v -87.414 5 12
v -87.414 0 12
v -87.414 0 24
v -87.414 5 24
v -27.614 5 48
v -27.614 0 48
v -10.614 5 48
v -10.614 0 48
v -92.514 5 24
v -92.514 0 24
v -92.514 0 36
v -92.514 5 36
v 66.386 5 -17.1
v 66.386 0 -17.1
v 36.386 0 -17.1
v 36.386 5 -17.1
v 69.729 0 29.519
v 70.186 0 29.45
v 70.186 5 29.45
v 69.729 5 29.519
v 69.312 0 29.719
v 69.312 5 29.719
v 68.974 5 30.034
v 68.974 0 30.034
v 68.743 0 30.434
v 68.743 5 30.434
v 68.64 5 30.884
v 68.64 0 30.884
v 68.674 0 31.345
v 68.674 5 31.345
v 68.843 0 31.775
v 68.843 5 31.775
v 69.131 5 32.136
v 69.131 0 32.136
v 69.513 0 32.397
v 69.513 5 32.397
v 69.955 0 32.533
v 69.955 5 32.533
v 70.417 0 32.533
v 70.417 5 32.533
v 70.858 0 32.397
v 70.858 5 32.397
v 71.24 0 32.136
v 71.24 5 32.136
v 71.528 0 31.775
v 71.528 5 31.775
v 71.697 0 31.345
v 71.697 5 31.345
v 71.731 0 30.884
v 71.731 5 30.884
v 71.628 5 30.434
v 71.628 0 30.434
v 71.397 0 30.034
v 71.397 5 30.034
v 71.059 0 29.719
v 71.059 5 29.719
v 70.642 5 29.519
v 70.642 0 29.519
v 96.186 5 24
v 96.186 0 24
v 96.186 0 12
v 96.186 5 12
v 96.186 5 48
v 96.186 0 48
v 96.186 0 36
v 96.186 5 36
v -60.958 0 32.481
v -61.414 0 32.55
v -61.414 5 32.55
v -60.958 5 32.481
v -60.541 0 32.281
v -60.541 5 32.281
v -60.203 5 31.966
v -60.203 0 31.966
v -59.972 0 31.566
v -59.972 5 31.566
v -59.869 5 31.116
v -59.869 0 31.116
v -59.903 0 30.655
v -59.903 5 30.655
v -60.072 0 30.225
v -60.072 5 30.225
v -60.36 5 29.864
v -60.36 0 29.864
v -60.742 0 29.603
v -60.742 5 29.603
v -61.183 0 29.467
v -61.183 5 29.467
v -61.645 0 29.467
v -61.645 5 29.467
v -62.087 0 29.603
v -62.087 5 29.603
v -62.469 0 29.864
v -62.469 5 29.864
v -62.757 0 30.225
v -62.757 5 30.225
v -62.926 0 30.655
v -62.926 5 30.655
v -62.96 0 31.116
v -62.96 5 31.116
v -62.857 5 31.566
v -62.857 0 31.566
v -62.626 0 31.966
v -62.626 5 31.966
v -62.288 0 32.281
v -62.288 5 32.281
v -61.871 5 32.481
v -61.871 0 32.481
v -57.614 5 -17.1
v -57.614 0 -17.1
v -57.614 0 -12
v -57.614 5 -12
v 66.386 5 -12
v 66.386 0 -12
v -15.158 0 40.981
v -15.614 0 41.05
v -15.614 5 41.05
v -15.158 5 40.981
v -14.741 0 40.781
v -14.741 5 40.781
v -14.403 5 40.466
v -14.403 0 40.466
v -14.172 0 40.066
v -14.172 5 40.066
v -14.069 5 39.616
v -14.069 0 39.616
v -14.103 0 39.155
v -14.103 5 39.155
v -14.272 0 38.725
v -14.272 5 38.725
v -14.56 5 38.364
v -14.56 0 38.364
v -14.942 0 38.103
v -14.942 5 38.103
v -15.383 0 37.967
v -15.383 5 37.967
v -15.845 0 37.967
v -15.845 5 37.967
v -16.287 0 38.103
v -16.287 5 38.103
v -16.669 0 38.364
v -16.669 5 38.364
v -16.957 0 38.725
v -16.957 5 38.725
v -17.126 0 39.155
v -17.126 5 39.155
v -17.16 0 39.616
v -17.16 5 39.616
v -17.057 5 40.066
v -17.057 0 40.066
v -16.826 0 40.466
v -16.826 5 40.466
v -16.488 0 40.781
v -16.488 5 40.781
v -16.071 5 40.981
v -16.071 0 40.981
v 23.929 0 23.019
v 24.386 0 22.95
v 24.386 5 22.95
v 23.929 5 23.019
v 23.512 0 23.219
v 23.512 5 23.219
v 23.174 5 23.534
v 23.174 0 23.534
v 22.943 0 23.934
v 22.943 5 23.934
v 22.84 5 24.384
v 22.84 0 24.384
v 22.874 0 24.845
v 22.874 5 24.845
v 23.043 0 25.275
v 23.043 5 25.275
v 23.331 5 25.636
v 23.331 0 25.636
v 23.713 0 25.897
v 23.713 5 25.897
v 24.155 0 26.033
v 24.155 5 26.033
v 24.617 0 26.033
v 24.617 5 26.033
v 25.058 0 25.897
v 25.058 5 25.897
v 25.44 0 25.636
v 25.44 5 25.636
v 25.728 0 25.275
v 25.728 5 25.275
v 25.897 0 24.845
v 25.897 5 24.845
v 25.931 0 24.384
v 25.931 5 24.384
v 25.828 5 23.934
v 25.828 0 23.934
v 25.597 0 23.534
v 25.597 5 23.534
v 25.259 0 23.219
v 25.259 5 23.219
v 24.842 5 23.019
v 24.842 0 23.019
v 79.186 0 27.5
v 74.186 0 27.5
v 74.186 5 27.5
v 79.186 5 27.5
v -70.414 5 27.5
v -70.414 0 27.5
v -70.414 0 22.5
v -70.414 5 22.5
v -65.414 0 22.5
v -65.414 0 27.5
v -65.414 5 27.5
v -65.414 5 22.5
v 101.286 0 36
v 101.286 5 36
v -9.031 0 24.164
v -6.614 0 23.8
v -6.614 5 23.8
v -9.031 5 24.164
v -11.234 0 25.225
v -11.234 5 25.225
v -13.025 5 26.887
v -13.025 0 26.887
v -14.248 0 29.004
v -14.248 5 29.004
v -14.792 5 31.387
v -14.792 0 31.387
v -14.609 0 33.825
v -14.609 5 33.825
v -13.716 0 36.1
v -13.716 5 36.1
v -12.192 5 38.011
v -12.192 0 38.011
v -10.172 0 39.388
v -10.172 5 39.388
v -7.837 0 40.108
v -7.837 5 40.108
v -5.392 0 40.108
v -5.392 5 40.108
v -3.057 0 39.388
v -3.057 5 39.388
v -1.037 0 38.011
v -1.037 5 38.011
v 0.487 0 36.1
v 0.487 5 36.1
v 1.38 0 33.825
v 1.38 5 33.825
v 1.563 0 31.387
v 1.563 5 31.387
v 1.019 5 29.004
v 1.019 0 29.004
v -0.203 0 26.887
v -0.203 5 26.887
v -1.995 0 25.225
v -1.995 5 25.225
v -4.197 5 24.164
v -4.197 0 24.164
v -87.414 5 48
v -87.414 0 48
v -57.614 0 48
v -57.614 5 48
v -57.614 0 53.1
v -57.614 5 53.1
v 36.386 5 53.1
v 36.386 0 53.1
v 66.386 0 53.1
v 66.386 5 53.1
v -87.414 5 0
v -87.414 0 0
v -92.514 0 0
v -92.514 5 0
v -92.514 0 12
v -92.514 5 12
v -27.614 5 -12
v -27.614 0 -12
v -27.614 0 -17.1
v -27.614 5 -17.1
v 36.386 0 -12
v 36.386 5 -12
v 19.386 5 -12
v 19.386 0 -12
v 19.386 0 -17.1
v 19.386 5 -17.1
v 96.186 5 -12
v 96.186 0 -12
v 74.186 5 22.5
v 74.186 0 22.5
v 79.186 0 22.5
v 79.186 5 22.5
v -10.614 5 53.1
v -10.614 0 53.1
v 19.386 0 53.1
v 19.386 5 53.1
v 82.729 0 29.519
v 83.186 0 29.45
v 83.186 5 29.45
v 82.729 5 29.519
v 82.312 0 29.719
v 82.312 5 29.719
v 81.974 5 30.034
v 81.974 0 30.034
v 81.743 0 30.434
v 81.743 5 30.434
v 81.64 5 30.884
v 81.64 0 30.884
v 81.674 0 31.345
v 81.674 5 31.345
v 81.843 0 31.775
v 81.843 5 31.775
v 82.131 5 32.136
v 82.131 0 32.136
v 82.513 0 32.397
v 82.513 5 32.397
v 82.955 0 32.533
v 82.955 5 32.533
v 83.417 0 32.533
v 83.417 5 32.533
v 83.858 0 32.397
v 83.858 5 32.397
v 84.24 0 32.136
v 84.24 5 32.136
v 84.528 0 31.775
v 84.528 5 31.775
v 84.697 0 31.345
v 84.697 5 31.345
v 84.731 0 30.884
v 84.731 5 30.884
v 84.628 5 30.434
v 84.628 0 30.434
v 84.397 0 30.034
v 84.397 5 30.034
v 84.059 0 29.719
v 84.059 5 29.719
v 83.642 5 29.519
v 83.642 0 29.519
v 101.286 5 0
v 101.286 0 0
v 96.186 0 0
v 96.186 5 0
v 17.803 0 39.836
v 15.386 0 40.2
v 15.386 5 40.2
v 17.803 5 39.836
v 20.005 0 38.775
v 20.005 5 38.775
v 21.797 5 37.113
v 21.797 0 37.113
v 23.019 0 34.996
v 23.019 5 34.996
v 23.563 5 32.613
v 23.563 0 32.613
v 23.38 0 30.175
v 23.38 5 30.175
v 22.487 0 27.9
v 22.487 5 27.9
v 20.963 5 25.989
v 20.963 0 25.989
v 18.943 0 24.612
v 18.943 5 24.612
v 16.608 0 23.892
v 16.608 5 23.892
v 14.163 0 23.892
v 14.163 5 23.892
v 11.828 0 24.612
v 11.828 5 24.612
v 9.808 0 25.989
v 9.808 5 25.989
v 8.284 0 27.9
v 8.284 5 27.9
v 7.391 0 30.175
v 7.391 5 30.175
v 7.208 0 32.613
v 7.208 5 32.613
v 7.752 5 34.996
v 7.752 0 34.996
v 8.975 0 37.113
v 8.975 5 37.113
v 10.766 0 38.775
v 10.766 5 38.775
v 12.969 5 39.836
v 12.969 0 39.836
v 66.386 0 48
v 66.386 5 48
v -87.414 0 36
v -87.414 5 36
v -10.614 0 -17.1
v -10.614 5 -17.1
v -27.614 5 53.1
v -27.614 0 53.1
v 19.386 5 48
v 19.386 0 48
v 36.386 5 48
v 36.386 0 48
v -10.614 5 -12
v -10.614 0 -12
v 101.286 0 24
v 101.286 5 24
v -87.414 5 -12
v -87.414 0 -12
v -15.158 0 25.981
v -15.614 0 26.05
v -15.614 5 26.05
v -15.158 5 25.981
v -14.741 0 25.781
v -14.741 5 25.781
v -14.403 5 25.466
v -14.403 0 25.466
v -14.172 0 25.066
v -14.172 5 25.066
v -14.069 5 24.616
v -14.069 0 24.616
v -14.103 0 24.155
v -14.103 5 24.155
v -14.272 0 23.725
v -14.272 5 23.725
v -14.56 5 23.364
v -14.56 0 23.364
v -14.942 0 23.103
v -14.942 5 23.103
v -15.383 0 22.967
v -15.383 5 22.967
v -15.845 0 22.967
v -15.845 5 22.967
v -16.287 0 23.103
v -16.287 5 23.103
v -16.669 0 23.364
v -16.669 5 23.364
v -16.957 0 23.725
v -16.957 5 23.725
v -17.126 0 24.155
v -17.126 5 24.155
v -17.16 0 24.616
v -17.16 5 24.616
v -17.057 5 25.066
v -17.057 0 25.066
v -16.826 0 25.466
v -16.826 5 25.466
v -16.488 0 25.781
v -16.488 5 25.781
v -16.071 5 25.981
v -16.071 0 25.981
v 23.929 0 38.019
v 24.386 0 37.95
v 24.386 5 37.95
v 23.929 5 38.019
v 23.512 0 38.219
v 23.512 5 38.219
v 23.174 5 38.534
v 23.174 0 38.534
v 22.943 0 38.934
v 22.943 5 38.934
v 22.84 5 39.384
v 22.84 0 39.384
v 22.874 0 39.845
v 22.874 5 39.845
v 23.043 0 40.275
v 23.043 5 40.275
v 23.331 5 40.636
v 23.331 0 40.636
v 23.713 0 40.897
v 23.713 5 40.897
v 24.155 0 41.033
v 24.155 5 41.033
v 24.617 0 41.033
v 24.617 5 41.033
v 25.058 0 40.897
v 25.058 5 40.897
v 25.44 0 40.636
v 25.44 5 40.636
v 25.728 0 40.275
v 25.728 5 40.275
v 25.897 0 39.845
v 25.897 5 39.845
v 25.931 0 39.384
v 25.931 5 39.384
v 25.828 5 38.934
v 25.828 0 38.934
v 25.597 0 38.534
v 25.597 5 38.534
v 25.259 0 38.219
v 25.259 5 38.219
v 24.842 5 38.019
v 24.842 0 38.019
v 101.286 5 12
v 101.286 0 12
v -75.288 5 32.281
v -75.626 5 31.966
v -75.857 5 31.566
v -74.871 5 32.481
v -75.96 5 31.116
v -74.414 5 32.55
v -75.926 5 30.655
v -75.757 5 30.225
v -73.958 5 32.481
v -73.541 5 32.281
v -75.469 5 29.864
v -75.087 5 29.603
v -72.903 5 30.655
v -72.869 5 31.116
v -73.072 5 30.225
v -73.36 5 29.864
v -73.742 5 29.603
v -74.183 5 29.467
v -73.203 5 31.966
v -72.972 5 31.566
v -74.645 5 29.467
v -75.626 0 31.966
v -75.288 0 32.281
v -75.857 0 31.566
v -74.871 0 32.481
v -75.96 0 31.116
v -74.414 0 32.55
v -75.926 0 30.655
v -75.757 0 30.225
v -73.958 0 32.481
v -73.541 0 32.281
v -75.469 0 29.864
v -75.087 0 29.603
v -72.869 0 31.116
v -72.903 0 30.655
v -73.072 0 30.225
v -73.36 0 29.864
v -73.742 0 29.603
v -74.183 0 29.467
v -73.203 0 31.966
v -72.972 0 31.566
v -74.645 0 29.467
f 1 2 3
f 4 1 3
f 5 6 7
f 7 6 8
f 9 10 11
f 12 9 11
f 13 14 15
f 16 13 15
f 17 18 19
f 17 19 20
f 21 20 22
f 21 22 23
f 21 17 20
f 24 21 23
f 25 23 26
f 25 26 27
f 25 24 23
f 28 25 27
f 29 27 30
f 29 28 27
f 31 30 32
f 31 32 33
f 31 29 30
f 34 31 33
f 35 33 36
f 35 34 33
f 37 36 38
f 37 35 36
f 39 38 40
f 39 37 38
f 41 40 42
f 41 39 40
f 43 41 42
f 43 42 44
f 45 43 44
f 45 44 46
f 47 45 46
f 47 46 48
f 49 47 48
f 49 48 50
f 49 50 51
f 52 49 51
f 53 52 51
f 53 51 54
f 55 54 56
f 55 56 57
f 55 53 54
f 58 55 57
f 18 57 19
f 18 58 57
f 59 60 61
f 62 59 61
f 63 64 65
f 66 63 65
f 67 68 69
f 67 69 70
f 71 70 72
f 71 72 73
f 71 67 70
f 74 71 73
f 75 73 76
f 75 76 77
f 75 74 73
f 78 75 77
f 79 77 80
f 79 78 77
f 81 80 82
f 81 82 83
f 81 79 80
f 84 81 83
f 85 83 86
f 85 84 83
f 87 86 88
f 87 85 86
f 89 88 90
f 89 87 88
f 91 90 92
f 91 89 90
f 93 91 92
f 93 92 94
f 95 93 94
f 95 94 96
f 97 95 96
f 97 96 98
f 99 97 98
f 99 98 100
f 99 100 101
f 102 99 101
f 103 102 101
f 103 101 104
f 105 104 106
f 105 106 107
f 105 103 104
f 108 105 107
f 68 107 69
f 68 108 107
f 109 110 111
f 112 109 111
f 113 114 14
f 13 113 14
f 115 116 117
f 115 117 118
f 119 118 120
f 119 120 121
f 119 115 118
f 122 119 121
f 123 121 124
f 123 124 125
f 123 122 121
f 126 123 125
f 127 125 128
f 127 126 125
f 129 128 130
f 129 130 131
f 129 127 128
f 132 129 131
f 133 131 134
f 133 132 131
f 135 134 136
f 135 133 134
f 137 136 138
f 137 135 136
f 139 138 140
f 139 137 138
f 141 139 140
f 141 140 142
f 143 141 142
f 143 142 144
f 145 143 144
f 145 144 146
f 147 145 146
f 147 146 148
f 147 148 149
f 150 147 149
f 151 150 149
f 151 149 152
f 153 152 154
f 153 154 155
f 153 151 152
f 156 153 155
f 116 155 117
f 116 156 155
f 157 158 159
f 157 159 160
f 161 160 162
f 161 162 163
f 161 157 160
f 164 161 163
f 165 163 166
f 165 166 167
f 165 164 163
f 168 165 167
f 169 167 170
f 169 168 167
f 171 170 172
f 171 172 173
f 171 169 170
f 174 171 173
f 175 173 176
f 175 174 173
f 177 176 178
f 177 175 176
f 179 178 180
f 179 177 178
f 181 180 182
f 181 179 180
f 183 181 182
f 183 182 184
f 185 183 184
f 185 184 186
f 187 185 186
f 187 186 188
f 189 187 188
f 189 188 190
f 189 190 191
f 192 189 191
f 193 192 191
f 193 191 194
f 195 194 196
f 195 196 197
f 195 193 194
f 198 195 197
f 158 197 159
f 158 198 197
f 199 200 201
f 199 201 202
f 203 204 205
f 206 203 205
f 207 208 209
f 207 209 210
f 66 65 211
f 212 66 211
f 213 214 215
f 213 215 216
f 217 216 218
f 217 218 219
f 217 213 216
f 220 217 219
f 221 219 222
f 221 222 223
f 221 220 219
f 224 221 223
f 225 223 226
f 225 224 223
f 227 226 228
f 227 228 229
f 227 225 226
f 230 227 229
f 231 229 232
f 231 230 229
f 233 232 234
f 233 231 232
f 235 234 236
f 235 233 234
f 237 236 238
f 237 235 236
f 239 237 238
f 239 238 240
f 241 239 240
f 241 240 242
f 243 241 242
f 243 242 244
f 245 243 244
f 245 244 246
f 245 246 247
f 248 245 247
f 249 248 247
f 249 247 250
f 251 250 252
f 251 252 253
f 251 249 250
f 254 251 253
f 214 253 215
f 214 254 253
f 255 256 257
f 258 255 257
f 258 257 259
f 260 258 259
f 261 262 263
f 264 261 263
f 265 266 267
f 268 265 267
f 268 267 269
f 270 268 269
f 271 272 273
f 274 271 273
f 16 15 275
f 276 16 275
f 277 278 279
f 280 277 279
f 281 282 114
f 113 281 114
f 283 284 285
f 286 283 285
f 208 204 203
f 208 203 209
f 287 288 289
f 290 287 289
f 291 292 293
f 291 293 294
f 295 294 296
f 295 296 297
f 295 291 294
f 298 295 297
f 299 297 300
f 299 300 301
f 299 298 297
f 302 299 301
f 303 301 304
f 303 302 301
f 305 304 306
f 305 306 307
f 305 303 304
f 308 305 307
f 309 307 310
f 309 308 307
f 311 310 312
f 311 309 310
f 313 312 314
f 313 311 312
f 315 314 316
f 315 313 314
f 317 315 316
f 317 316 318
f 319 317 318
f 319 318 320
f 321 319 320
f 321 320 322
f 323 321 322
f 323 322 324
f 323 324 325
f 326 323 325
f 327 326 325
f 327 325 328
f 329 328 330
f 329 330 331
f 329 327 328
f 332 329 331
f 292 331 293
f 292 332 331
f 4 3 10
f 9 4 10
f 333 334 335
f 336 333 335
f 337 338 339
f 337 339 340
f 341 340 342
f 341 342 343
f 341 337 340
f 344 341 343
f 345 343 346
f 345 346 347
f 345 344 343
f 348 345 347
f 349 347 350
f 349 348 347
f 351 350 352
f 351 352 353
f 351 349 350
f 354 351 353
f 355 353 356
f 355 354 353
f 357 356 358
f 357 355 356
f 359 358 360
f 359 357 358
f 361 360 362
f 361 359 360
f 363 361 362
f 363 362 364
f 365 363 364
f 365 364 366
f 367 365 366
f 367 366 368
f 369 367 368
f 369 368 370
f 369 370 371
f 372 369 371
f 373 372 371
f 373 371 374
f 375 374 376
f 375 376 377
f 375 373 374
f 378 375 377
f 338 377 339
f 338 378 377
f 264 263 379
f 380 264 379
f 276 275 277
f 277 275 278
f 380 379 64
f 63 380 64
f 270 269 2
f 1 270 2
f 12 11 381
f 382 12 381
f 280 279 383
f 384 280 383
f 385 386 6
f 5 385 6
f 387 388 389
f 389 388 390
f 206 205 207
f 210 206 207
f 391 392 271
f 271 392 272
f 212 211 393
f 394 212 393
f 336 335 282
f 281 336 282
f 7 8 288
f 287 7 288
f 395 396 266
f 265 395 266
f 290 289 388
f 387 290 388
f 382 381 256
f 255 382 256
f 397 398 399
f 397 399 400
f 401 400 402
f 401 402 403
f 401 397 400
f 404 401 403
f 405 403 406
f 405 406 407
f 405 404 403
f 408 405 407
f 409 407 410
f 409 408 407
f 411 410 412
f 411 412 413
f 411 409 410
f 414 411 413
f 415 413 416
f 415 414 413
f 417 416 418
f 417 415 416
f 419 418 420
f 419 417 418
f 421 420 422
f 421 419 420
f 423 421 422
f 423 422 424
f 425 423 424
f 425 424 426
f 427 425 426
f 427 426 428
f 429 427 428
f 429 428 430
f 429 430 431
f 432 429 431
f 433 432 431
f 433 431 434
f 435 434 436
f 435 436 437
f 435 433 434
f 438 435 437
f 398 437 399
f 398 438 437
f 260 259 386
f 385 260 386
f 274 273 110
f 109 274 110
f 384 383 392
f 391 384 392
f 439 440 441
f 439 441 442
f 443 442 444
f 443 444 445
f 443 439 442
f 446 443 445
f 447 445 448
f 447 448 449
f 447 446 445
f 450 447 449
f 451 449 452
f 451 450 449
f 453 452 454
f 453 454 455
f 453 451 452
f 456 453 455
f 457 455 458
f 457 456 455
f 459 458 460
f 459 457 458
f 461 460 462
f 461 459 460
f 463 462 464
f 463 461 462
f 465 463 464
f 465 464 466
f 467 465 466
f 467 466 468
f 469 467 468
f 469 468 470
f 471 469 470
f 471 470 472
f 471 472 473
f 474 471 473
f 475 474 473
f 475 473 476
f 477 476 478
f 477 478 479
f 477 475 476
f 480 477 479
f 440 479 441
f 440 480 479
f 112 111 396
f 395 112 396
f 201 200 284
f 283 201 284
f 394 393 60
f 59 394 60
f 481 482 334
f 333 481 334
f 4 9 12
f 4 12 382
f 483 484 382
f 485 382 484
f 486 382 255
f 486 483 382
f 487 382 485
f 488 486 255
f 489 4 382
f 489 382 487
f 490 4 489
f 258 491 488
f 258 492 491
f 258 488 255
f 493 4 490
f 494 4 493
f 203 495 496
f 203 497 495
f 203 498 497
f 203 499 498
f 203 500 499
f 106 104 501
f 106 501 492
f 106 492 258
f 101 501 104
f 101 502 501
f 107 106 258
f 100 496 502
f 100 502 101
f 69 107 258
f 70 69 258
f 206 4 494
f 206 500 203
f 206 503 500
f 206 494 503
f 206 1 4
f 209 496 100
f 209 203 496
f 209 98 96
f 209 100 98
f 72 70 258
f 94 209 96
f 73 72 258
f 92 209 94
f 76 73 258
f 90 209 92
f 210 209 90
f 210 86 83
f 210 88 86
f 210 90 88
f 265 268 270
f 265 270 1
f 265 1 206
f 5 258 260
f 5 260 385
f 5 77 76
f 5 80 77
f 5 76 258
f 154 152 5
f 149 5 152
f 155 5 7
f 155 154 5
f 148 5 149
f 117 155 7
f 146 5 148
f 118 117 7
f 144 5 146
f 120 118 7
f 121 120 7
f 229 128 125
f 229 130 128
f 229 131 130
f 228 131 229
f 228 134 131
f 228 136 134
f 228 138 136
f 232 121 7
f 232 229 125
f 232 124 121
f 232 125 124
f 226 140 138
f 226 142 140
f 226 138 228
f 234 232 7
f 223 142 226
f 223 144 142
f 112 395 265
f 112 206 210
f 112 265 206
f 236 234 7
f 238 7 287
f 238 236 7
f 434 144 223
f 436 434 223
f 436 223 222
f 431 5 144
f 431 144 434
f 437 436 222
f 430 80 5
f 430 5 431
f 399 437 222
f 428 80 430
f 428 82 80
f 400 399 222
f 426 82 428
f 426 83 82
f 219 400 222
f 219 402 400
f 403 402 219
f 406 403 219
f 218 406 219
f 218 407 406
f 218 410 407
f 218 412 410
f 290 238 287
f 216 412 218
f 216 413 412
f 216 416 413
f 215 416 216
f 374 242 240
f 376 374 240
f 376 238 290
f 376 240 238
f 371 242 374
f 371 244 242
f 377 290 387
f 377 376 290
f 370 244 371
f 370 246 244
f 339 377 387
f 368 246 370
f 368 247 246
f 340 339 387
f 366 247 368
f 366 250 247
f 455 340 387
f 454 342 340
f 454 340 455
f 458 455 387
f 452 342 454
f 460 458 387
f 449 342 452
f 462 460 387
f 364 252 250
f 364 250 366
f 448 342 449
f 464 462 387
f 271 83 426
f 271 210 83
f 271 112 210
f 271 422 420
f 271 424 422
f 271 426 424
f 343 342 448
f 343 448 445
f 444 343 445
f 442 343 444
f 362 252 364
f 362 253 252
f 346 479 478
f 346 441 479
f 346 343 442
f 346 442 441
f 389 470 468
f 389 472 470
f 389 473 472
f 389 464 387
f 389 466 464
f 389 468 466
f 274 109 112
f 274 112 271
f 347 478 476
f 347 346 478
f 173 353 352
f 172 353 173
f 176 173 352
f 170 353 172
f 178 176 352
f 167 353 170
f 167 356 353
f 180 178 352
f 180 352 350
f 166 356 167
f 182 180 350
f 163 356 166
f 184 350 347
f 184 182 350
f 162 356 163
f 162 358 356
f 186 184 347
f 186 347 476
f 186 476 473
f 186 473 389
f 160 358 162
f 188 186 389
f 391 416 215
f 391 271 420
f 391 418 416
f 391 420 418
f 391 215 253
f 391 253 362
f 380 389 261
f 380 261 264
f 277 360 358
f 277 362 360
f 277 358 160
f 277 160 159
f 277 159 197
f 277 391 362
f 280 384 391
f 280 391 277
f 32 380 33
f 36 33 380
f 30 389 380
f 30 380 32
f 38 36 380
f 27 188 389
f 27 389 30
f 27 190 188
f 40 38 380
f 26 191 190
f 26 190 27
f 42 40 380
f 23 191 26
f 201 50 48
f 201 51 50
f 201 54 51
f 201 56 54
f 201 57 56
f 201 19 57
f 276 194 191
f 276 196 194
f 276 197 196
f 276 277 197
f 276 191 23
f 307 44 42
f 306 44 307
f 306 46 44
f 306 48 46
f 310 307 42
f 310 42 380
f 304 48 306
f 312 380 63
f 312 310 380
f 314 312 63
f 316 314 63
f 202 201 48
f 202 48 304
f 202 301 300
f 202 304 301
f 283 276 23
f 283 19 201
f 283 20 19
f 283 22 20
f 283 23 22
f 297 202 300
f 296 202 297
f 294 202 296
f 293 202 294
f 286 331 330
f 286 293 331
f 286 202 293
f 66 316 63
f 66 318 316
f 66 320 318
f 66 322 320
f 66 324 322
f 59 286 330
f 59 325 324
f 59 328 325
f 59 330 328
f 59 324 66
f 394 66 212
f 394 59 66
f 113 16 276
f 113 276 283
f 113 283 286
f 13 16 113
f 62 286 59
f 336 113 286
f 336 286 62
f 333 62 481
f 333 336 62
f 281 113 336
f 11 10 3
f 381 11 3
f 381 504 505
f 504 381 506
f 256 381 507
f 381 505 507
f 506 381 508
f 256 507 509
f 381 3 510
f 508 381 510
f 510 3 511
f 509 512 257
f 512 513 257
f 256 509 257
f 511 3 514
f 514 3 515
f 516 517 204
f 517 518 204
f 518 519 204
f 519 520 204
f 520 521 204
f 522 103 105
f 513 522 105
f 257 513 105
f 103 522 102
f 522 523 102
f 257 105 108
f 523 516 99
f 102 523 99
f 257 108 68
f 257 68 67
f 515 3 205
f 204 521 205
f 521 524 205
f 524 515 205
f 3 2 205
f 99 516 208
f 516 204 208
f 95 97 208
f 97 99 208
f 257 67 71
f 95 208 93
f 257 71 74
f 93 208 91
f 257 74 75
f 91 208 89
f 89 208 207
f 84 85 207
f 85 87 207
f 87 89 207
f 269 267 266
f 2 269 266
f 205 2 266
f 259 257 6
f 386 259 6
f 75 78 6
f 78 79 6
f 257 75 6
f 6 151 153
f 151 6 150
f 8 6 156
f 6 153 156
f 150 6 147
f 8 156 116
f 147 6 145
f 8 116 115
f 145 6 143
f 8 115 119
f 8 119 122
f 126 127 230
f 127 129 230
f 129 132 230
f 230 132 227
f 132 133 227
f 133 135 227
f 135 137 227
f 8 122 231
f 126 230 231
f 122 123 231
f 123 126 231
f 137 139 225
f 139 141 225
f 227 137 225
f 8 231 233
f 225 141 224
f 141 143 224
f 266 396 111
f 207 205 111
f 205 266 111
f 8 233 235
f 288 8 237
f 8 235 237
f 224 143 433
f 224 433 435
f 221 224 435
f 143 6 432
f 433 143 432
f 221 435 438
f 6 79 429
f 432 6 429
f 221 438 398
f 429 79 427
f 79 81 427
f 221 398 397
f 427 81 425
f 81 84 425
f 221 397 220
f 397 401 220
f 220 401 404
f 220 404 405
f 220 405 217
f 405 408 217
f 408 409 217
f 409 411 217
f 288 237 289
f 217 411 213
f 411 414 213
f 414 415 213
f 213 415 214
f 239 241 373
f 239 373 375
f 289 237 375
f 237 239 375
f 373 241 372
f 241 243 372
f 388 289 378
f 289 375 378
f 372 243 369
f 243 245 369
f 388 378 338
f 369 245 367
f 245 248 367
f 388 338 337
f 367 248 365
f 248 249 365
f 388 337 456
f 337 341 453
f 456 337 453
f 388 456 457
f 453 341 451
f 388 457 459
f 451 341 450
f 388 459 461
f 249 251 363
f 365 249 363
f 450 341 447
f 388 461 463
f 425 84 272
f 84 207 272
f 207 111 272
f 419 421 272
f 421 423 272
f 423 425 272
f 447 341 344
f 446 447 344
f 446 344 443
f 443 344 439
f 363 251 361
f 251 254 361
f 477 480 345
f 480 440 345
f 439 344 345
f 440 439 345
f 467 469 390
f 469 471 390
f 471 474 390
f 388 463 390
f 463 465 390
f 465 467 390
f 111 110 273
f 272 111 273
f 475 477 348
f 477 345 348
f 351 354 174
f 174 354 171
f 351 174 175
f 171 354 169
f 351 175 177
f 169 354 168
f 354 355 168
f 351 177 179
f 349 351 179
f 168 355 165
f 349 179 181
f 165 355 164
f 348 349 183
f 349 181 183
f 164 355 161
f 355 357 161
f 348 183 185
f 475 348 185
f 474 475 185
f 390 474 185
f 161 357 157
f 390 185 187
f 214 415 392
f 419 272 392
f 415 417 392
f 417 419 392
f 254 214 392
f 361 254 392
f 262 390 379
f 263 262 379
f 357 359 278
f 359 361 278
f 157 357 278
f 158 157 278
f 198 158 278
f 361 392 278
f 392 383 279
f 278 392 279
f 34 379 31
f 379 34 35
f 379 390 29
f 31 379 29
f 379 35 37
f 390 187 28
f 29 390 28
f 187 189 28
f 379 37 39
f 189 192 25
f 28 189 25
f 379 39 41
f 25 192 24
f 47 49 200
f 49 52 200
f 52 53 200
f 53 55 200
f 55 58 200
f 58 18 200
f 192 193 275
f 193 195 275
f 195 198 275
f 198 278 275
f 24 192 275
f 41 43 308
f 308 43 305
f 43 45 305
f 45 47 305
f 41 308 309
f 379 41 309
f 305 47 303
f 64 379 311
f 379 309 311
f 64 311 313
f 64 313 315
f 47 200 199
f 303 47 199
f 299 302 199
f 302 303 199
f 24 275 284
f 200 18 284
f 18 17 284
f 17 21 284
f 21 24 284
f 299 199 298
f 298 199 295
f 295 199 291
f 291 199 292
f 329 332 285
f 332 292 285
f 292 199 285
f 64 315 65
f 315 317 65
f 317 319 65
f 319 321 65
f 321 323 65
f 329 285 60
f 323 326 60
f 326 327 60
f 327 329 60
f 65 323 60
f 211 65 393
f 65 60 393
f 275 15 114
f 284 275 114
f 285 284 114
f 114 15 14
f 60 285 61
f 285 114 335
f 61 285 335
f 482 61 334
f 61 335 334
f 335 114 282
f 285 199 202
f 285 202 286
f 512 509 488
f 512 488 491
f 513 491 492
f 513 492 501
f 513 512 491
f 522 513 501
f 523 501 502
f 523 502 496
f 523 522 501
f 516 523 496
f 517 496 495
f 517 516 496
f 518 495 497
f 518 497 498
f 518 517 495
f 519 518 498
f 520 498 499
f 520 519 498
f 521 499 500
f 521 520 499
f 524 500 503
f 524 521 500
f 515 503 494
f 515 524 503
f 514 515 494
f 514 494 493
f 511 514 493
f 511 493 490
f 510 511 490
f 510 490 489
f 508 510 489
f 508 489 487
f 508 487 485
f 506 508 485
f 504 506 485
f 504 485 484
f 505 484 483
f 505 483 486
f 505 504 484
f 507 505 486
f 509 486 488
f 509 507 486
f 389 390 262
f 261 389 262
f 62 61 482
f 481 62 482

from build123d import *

# Parameters (mm, degrees)
SKETCH1_R           = 8.2
SKETCH1_R_2         = 1.55
SKETCH1_W           = 5
SKETCH1_H           = 5
BOSS_EXTRUDE1_DEPTH = 5


with BuildPart() as part:
    # Sketch1 → Boss-Extrude1 (new body)
    with BuildSketch(Plane(origin=(0, 0, 0), x_dir=(1, 0, 0), z_dir=(0, 1, 0))):
        Polygon((-87.414457831, -48), (-57.614457831, -48), (-57.614457831, -53.1), (-27.614457831, -53.1), (-27.614457831, -48), (-10.614457831, -48), (-10.614457831, -53.1), (19.385542169, -53.1), (19.385542169, -48), (36.385542169, -48), (36.385542169, -53.1), (66.385542169, -53.1), (66.385542169, -48), (96.185542169, -48), (96.185542169, -36), (101.285542169, -36), (101.285542169, -24), (96.185542169, -24), (96.185542169, -12), (101.285542169, -12), (101.285542169, 0), (96.185542169, 0), (96.185542169, 12), (66.385542169, 12), (66.385542169, 17.1), (36.385542169, 17.1), (36.385542169, 12), (19.385542169, 12), (19.385542169, 17.1), (-10.614457831, 17.1), (-10.614457831, 12), (-27.614457831, 12), (-27.614457831, 17.1), (-57.614457831, 17.1), (-57.614457831, 12), (-87.414457831, 12), (-87.414457831, 0), (-92.514457831, 0), (-92.514457831, -12), (-87.414457831, -12), (-87.414457831, -24), (-92.514457831, -24), (-92.514457831, -36), (-87.414457831, -36), align=None)
        with Locations(Location((15.385542169, -32, 0), (0, 0, 270))):
            Circle(SKETCH1_R, mode=Mode.SUBTRACT)
        with Locations(Location((-6.614457831, -32, 0), (0, 0, 90))):
            Circle(SKETCH1_R, mode=Mode.SUBTRACT)
        with Locations(Location((-15.614457831, -24.5, 0), (0, 0, 270))):
            Circle(SKETCH1_R_2, mode=Mode.SUBTRACT)
        with Locations(Location((-15.614457831, -39.5, 0), (0, 0, 270))):
            Circle(SKETCH1_R_2, mode=Mode.SUBTRACT)
        with Locations(Location((-74.414457831, -31, 0), (0, 0, 270))):
            Circle(SKETCH1_R_2, mode=Mode.SUBTRACT)
        with Locations(Location((-61.414457831, -31, 0), (0, 0, 270))):
            Circle(SKETCH1_R_2, mode=Mode.SUBTRACT)
        with Locations(Location((24.385542169, -39.5, 0), (0, 0, 90))):
            Circle(SKETCH1_R_2, mode=Mode.SUBTRACT)
        with Locations(Location((24.385542169, -24.5, 0), (0, 0, 90))):
            Circle(SKETCH1_R_2, mode=Mode.SUBTRACT)
        with Locations(Location((70.185542169, -31, 0), (0, 0, 90))):
            Circle(SKETCH1_R_2, mode=Mode.SUBTRACT)
        with Locations(Location((83.185542169, -31, 0), (0, 0, 90))):
            Circle(SKETCH1_R_2, mode=Mode.SUBTRACT)
        with Locations((-67.914457831, -25)):
            Rectangle(SKETCH1_W, SKETCH1_H, mode=Mode.SUBTRACT)
        with Locations((76.685542169, -25)):
            Rectangle(SKETCH1_W, SKETCH1_H, mode=Mode.SUBTRACT)
    extrude(amount=BOSS_EXTRUDE1_DEPTH)


solid = part.part
